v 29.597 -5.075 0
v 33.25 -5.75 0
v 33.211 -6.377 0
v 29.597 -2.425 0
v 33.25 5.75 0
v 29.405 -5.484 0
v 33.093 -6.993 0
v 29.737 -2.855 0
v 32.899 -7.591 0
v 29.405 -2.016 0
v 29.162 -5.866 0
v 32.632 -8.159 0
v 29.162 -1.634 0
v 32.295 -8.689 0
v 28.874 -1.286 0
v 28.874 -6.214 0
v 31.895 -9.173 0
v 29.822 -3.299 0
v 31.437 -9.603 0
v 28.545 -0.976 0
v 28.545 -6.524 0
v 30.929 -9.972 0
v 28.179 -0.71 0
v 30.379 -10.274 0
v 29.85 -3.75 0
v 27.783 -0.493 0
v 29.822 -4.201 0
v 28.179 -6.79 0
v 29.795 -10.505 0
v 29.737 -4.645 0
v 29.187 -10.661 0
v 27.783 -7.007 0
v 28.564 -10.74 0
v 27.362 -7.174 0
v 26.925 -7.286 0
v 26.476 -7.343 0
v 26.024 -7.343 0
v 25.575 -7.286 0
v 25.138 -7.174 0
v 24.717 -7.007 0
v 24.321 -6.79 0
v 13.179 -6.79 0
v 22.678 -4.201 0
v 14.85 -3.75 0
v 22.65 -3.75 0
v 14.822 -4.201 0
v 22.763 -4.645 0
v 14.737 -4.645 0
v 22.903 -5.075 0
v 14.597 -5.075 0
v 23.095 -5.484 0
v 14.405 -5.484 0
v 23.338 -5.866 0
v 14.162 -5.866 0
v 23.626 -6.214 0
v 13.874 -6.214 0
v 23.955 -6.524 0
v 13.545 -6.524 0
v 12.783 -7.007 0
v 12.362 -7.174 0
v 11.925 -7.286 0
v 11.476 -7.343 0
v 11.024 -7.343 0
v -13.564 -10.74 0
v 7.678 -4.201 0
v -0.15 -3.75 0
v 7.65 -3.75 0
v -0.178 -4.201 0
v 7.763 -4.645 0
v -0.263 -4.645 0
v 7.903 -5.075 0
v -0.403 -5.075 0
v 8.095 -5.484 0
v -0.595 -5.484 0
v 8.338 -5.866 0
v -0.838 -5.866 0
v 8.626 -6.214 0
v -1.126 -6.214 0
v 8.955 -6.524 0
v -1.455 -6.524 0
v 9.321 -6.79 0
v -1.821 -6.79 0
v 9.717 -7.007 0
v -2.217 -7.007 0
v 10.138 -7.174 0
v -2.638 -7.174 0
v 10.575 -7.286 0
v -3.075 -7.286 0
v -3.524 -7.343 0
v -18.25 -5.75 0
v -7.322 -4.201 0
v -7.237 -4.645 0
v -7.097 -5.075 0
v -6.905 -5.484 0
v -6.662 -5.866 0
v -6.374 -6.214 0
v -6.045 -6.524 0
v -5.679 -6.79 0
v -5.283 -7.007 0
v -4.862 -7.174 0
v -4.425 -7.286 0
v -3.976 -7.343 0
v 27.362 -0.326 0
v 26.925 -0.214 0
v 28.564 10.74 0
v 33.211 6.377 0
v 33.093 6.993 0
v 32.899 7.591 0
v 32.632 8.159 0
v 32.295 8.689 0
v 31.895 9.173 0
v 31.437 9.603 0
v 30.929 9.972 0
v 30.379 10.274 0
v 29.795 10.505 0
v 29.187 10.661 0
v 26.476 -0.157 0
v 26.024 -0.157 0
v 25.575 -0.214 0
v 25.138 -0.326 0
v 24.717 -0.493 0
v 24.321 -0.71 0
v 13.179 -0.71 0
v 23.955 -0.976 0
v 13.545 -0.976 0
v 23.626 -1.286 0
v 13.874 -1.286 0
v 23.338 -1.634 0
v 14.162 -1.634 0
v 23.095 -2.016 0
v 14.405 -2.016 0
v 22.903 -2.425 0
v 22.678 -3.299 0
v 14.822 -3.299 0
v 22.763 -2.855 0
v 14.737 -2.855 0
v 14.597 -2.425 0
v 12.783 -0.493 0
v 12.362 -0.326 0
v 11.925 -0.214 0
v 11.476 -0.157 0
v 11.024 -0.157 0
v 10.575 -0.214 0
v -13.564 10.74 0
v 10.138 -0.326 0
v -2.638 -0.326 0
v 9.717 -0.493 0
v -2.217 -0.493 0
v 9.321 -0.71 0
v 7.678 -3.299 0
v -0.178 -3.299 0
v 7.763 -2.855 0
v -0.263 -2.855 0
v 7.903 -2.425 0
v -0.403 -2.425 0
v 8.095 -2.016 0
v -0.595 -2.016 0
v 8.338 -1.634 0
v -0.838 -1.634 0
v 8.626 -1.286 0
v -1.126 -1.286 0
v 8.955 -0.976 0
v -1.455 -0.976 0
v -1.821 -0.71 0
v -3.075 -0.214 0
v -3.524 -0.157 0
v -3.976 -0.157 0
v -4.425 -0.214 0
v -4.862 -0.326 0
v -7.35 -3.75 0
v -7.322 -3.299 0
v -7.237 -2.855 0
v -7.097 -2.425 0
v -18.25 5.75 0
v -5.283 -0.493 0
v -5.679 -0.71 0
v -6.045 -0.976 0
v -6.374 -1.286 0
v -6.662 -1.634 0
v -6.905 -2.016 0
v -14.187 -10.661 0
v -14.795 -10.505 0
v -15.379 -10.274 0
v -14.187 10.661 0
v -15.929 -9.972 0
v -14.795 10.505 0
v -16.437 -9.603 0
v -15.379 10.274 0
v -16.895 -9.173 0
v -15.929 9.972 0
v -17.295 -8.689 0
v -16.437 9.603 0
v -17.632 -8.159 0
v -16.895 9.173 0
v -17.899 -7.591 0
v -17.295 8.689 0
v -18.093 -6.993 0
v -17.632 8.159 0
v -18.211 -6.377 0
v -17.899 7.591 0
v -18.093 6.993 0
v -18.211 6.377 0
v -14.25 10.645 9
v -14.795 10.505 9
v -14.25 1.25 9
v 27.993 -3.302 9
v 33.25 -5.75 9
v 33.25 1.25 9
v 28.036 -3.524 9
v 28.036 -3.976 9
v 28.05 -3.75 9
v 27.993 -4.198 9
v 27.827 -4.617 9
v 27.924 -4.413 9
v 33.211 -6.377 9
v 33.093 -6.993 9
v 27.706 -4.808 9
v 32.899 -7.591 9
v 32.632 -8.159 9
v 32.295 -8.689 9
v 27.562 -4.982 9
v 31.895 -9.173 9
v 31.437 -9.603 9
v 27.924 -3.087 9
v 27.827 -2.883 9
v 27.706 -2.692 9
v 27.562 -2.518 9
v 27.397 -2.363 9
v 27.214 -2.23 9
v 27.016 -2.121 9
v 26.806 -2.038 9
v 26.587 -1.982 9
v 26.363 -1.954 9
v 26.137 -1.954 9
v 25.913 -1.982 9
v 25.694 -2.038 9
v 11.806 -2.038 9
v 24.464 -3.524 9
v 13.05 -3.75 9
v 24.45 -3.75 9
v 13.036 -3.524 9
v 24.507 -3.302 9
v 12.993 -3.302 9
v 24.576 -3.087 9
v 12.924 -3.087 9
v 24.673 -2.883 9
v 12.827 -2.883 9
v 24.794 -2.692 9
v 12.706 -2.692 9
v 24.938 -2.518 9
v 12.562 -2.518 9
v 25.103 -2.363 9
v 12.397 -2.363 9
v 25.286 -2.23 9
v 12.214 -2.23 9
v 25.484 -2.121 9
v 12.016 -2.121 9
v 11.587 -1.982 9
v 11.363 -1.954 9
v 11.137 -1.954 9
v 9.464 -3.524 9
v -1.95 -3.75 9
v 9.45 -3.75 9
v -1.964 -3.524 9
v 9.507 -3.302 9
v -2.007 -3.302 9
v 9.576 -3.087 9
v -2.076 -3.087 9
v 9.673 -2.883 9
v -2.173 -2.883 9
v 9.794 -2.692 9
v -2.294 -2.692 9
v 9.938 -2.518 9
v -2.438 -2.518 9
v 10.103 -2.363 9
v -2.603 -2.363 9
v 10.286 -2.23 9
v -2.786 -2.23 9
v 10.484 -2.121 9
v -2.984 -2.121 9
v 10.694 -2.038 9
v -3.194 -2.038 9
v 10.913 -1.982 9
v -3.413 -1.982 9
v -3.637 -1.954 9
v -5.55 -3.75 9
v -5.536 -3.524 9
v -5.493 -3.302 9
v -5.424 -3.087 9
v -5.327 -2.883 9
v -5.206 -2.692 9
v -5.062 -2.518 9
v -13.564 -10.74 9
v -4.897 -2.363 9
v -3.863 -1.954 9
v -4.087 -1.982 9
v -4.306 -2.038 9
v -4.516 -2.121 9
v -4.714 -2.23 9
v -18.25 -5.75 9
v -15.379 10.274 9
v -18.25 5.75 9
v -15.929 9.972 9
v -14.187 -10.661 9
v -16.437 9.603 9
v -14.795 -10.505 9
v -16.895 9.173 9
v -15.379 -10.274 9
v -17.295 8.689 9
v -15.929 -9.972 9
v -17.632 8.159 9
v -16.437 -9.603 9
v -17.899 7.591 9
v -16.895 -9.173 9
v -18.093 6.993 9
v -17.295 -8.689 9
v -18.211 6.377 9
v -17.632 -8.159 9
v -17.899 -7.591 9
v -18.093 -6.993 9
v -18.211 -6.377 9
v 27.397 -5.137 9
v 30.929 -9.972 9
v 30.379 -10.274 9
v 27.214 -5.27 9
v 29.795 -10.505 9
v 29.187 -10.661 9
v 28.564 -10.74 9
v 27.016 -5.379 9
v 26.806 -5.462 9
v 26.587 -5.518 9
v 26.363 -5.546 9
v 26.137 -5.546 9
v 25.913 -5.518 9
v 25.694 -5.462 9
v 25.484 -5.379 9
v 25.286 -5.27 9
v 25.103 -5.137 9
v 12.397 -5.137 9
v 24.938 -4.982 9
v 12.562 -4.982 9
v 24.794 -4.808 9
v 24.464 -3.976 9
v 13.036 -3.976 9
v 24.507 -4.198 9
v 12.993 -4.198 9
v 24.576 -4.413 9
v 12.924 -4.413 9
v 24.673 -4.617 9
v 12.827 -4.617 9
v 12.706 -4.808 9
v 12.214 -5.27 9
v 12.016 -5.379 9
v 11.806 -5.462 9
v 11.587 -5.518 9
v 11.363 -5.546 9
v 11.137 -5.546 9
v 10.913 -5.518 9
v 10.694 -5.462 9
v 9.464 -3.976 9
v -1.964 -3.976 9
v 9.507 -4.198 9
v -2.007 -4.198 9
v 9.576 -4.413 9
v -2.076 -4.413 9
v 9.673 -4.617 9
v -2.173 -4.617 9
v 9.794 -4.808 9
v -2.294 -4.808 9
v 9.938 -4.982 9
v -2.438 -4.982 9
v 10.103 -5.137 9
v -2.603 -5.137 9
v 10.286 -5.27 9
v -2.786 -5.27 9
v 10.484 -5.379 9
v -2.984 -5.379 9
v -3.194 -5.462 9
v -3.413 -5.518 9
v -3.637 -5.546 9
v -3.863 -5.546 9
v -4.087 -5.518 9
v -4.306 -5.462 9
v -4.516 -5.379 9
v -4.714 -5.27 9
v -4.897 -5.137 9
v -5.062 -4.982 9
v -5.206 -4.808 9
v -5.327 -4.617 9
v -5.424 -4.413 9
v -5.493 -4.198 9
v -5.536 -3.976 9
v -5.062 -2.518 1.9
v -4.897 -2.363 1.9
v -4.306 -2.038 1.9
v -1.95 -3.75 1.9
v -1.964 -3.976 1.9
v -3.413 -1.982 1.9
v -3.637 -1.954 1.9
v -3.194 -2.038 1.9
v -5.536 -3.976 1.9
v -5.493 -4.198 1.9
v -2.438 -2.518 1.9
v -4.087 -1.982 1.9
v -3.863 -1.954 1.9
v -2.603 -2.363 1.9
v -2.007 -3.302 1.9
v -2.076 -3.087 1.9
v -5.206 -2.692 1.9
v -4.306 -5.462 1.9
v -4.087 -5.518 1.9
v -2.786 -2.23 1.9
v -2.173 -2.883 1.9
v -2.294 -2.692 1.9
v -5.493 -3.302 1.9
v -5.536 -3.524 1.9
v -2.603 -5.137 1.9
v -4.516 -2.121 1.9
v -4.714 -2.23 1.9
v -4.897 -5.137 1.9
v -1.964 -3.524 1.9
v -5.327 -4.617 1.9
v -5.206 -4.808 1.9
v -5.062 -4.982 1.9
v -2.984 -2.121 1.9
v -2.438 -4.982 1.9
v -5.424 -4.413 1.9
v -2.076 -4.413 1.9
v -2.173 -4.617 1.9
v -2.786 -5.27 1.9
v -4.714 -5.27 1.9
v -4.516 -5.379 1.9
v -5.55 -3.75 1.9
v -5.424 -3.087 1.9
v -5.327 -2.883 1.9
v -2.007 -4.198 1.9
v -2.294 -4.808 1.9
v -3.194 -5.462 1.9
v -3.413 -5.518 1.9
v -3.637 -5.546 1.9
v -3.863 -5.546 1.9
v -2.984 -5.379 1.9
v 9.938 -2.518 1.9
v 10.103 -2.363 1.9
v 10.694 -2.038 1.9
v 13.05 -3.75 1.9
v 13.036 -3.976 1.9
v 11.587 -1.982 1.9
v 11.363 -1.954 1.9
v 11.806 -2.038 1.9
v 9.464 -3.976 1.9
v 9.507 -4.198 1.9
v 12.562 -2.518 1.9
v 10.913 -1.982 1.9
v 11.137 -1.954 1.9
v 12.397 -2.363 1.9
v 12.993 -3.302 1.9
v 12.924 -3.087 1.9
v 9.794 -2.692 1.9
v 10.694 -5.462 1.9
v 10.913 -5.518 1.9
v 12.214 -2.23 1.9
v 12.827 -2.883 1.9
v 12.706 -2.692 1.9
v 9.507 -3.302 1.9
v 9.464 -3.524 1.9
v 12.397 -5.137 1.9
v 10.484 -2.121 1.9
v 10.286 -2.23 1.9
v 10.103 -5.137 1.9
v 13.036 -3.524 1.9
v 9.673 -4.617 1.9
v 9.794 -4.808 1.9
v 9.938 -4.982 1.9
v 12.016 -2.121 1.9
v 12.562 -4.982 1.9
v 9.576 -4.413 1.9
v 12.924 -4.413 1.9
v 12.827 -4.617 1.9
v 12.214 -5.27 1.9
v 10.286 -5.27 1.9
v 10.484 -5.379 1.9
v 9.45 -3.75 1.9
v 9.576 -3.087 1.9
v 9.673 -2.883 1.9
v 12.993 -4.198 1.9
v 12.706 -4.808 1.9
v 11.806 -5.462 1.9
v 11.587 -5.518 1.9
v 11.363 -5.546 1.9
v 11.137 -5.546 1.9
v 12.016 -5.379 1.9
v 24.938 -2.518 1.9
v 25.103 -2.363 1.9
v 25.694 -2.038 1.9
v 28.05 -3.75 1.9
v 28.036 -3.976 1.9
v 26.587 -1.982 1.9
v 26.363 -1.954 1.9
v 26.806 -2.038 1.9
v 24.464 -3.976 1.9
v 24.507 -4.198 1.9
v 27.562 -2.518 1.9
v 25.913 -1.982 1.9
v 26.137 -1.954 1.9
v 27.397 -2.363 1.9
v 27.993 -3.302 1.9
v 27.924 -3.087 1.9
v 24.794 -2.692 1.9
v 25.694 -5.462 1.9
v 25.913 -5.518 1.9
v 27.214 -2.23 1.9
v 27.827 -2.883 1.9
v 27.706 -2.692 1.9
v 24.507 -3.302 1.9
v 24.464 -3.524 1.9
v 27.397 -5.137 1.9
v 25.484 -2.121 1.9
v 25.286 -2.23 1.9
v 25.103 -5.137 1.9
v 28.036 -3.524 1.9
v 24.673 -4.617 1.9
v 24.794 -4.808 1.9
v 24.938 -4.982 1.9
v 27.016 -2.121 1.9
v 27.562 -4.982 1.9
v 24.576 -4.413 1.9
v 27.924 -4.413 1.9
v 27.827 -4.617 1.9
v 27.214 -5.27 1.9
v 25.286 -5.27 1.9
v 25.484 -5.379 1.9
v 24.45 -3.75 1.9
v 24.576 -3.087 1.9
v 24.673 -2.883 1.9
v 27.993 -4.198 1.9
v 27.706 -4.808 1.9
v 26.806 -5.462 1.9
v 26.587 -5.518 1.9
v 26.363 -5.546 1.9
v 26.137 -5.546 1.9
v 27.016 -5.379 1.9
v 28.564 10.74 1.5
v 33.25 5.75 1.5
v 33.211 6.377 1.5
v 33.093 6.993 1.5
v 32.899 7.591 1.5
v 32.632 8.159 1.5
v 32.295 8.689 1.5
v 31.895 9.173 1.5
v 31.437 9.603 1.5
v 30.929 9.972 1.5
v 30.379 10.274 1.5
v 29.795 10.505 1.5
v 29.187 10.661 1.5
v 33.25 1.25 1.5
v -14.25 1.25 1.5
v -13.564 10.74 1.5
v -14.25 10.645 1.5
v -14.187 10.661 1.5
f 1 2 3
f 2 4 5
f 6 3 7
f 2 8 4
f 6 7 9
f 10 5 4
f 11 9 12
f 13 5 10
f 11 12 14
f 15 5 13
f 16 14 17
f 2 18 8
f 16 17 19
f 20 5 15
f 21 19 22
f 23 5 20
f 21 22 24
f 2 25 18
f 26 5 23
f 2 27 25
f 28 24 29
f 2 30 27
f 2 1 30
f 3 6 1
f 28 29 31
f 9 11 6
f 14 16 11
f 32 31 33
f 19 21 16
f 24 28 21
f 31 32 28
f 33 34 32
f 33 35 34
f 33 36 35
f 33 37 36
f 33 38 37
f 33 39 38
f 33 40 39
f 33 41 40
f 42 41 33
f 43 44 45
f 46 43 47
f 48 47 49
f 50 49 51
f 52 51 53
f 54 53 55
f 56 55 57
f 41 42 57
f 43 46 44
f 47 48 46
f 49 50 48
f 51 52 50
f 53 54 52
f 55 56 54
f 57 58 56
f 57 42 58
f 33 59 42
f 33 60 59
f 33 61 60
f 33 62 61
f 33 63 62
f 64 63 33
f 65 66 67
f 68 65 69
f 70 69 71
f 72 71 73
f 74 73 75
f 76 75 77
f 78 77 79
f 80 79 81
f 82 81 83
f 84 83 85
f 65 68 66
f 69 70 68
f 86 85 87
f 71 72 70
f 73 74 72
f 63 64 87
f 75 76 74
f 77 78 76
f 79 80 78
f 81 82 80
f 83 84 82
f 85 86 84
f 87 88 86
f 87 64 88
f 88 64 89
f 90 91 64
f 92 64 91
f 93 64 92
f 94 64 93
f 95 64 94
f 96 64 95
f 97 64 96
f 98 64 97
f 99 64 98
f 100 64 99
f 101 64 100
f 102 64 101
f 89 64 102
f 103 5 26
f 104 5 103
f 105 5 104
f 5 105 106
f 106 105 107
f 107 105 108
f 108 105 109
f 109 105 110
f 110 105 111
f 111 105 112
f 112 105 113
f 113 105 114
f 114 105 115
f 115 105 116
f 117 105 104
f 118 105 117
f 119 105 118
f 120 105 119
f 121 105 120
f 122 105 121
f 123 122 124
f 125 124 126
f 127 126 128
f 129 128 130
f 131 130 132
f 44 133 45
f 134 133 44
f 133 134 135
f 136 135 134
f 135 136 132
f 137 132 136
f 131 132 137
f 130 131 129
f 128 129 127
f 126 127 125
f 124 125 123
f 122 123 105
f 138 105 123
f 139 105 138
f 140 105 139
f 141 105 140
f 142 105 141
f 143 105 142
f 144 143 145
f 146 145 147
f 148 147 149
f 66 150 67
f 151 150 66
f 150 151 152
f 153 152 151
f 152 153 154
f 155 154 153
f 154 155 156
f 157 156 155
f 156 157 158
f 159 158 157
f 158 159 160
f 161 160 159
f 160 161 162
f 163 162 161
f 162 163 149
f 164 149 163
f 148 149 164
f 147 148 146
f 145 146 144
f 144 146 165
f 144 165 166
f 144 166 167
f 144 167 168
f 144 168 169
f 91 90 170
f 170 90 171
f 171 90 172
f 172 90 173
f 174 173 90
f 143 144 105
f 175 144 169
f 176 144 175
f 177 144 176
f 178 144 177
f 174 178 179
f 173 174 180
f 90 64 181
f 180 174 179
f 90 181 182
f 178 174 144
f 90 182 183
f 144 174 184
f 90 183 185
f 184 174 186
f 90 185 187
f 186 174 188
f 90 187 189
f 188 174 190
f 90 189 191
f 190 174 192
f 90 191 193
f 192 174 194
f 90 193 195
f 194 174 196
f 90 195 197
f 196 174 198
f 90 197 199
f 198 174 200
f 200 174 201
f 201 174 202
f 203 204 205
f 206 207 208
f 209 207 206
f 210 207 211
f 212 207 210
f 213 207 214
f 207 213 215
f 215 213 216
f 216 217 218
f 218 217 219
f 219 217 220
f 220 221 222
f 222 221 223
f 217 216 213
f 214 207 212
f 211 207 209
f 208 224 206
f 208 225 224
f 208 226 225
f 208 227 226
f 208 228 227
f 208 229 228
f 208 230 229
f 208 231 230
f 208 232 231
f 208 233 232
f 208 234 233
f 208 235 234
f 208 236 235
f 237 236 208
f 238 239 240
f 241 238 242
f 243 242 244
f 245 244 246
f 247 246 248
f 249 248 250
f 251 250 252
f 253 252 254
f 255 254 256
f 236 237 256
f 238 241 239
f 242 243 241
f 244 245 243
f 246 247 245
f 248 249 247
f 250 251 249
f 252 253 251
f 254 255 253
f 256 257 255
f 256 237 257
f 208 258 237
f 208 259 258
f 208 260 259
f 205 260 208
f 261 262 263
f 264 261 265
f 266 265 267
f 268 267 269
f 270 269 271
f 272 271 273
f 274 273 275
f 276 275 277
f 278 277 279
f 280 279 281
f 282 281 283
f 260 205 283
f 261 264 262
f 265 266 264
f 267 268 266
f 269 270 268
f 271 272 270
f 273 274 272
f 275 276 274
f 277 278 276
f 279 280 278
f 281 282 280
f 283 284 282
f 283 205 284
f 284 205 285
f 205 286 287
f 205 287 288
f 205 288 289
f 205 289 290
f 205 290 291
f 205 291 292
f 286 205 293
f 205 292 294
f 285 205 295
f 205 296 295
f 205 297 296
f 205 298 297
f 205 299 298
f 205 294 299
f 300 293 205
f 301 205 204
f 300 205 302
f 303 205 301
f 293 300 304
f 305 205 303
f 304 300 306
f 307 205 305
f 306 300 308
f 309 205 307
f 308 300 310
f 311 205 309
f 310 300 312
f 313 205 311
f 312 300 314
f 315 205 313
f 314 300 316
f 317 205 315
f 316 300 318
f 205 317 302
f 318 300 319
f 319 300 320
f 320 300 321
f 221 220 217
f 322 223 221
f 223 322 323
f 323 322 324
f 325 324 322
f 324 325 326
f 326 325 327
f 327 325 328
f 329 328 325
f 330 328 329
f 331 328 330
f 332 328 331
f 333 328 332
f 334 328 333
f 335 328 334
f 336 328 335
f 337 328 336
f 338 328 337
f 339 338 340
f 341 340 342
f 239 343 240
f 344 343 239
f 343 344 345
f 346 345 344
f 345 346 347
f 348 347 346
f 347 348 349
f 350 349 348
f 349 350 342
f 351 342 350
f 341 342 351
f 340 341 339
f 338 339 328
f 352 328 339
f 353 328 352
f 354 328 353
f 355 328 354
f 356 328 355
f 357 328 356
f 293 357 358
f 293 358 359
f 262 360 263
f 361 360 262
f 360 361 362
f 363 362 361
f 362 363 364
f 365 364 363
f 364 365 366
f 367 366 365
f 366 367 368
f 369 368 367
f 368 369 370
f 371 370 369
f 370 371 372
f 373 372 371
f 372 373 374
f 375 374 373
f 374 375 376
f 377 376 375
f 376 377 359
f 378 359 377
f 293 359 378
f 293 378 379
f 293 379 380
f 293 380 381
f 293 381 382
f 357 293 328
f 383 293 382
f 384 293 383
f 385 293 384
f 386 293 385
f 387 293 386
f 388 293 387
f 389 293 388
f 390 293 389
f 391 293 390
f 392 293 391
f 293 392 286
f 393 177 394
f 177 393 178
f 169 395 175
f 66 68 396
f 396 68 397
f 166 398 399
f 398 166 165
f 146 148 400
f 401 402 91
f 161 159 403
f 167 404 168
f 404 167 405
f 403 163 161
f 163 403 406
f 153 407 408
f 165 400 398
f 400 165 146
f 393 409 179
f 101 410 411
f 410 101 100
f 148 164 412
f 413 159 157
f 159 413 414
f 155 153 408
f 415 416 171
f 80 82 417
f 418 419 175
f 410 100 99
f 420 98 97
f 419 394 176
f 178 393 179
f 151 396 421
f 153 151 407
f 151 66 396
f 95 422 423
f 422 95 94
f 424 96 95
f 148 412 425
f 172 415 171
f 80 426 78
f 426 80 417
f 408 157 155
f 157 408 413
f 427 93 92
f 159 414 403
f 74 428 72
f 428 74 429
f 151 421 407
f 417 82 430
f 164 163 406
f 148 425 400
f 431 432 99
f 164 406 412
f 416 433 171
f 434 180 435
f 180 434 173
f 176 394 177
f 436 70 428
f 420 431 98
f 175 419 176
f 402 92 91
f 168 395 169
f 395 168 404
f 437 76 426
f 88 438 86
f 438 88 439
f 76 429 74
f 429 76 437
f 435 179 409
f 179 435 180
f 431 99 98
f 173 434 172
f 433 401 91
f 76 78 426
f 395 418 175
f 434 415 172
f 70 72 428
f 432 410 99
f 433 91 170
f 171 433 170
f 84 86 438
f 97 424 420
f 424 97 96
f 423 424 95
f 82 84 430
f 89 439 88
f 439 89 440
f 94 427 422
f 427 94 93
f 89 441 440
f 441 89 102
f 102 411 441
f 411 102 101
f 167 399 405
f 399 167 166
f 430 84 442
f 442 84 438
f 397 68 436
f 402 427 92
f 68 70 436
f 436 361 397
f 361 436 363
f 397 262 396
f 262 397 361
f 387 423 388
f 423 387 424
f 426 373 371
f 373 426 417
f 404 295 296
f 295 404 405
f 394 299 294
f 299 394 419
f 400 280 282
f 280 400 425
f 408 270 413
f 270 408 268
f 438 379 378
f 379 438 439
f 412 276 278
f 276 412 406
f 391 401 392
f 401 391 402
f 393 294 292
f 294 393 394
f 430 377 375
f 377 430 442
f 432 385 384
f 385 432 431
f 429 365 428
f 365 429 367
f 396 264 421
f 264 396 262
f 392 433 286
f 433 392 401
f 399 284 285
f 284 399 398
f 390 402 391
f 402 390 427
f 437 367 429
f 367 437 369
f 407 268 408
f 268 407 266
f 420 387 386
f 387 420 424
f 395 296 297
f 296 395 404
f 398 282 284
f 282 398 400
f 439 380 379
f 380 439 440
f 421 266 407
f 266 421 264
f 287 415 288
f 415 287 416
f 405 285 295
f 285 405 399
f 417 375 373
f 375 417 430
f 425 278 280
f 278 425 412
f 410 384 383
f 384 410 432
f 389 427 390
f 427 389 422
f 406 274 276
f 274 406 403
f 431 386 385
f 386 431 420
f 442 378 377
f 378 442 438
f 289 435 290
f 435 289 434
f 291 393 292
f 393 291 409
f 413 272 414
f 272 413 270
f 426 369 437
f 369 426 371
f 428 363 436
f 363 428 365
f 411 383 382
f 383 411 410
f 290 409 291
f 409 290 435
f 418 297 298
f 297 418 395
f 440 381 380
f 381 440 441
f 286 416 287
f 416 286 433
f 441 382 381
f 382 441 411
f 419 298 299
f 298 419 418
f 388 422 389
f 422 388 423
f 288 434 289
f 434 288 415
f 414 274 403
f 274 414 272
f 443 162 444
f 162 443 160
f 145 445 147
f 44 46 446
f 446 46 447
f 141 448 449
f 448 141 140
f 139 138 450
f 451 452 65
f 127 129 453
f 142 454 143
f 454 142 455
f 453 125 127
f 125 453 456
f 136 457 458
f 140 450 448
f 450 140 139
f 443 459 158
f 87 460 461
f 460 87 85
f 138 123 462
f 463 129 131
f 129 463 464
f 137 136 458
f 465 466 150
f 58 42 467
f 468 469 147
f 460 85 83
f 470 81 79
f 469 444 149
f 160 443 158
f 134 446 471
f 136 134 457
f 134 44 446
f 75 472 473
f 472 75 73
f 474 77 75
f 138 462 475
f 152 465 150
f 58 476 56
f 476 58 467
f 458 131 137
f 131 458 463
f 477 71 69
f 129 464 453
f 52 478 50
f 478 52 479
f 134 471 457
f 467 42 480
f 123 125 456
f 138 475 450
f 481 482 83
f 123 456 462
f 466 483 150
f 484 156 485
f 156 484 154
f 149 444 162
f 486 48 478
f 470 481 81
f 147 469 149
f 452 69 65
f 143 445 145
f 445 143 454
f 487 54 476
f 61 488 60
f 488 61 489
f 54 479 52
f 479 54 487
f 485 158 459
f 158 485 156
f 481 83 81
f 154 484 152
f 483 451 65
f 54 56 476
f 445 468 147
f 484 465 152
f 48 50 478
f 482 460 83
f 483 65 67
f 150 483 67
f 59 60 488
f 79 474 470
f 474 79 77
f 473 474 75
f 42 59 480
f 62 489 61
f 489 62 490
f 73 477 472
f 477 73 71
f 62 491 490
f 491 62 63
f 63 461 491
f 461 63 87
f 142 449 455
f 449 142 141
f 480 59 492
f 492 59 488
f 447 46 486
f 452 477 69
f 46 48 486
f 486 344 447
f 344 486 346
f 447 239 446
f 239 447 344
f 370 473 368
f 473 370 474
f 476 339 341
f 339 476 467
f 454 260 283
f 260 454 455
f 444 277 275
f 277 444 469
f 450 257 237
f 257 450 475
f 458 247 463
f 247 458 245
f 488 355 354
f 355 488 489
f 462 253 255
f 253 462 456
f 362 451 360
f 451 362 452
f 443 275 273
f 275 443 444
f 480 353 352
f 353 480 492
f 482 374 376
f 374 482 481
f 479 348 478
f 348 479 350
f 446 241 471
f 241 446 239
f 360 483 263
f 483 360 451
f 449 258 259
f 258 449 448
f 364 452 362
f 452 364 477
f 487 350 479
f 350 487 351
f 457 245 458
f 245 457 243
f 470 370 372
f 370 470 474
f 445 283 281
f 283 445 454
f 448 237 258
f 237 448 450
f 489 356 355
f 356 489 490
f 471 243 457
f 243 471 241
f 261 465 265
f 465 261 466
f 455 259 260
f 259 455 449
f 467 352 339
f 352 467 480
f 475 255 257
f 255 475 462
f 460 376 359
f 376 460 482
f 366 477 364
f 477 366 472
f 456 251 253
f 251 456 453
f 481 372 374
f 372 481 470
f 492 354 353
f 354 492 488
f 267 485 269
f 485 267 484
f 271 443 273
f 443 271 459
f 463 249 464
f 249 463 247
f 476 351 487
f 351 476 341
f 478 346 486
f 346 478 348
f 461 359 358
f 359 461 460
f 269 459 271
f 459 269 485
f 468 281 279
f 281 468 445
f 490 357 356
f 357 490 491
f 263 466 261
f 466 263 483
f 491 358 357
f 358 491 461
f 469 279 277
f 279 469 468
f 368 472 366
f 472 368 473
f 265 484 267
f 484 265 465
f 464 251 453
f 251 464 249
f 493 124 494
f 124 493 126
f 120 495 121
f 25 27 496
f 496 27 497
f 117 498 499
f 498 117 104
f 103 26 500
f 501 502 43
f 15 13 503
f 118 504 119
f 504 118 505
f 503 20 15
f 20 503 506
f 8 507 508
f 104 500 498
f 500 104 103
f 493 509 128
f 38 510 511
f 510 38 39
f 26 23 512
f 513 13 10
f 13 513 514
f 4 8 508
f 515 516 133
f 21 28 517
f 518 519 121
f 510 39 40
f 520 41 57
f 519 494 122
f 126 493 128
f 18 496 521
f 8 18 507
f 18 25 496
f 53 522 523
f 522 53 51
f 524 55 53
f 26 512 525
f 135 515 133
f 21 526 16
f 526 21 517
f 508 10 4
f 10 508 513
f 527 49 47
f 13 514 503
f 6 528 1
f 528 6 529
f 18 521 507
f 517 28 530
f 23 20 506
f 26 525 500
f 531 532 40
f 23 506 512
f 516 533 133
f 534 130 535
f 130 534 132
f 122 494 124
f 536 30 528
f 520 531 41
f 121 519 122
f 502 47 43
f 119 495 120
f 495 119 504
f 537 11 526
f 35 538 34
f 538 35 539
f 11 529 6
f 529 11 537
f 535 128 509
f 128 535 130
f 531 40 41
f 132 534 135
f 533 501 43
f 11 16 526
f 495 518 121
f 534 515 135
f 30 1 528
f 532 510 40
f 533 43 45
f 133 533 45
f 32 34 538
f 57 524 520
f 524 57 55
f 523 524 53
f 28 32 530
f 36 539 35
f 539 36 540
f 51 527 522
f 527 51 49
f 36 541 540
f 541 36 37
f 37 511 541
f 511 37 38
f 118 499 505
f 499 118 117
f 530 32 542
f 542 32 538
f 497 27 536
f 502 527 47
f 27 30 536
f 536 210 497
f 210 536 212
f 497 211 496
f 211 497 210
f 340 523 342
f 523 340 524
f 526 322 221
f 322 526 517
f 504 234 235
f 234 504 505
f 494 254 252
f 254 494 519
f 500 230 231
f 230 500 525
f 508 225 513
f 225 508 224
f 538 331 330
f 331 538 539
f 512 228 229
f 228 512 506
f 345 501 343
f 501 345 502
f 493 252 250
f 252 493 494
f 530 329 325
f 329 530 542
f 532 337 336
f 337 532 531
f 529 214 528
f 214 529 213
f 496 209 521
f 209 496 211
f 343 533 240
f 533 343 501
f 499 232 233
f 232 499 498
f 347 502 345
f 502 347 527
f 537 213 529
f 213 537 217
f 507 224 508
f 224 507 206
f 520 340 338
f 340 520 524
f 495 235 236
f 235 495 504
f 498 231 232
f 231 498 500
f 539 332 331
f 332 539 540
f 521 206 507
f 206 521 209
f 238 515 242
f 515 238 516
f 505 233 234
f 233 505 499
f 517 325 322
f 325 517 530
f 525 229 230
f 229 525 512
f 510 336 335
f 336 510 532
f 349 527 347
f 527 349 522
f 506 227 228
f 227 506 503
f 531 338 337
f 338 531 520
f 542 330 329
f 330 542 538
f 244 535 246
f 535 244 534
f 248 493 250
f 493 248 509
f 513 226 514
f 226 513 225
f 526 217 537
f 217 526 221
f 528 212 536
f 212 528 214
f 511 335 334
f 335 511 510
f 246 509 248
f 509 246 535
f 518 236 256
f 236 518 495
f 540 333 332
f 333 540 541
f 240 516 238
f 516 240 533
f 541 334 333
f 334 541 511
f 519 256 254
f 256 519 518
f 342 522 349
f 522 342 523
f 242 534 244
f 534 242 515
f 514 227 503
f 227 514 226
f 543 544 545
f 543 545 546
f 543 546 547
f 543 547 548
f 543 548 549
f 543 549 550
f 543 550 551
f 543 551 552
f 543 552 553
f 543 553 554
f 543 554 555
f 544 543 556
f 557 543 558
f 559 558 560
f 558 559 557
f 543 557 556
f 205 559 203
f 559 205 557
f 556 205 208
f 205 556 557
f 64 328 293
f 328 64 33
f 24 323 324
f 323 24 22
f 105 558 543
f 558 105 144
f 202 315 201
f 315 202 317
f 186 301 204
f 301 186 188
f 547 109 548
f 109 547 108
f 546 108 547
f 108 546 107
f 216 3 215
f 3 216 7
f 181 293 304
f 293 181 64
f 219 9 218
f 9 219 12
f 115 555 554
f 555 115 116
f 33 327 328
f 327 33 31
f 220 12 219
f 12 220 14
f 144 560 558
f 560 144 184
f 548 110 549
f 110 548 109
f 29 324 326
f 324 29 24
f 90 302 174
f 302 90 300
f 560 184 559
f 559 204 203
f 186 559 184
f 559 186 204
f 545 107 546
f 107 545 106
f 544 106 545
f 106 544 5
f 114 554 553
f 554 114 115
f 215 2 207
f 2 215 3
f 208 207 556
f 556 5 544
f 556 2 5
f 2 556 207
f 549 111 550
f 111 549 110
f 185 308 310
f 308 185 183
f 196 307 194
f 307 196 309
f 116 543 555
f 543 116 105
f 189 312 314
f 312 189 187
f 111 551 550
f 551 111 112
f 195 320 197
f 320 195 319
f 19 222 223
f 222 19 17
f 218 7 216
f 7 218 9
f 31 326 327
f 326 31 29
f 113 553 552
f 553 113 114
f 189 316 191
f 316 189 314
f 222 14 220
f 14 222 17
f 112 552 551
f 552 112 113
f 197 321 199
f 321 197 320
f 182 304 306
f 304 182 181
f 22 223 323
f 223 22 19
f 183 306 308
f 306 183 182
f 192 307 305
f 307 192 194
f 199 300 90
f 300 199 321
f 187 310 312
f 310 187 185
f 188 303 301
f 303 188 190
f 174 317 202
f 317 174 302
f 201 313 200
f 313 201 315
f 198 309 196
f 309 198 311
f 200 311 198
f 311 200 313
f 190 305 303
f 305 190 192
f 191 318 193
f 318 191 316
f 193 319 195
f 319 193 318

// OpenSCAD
$fn = 50;


difference() {
	union() {
		translate(v = [7.5000000000, 0, 0]) {
			hull() {
				translate(v = [-20.7500000000, 5.7500000000, 0]) {
					cylinder(h = 9, r = 5);
				}
				translate(v = [20.7500000000, 5.7500000000, 0]) {
					cylinder(h = 9, r = 5);
				}
				translate(v = [-20.7500000000, -5.7500000000, 0]) {
					cylinder(h = 9, r = 5);
				}
				translate(v = [20.7500000000, -5.7500000000, 0]) {
					cylinder(h = 9, r = 5);
				}
			}
		}
	}
	union() {
		translate(v = [-3.7500000000, -3.7500000000, 0]) {
			rotate(a = [180, 0, 0]) {
				difference() {
					union() {
						#translate(v = [0, 0, -9.0000000000]) {
							cylinder(h = 9, r = 1.5000000000);
						}
						#translate(v = [0, 0, -1.9000000000]) {
							cylinder(h = 1.9000000000, r1 = 1.8000000000, r2 = 3.6000000000);
						}
						#translate(v = [0, 0, -9.0000000000]) {
							cylinder(h = 9, r = 1.8000000000);
						}
						#translate(v = [0, 0, -9.0000000000]) {
							cylinder(h = 9, r = 1.5000000000);
						}
					}
					union();
				}
			}
		}
		translate(v = [11.2500000000, -3.7500000000, 0]) {
			rotate(a = [180, 0, 0]) {
				difference() {
					union() {
						#translate(v = [0, 0, -9.0000000000]) {
							cylinder(h = 9, r = 1.5000000000);
						}
						#translate(v = [0, 0, -1.9000000000]) {
							cylinder(h = 1.9000000000, r1 = 1.8000000000, r2 = 3.6000000000);
						}
						#translate(v = [0, 0, -9.0000000000]) {
							cylinder(h = 9, r = 1.8000000000);
						}
						#translate(v = [0, 0, -9.0000000000]) {
							cylinder(h = 9, r = 1.5000000000);
						}
					}
					union();
				}
			}
		}
		translate(v = [26.2500000000, -3.7500000000, 0]) {
			rotate(a = [180, 0, 0]) {
				difference() {
					union() {
						#translate(v = [0, 0, -9.0000000000]) {
							cylinder(h = 9, r = 1.5000000000);
						}
						#translate(v = [0, 0, -1.9000000000]) {
							cylinder(h = 1.9000000000, r1 = 1.8000000000, r2 = 3.6000000000);
						}
						#translate(v = [0, 0, -9.0000000000]) {
							cylinder(h = 9, r = 1.8000000000);
						}
						#translate(v = [0, 0, -9.0000000000]) {
							cylinder(h = 9, r = 1.5000000000);
						}
					}
					union();
				}
			}
		}
		#translate(v = [-14.2500000000, 1.2500000000, 1.5000000000]) {
			cube(size = [156, 100, 7.5000000000]);
		}
	}
}
